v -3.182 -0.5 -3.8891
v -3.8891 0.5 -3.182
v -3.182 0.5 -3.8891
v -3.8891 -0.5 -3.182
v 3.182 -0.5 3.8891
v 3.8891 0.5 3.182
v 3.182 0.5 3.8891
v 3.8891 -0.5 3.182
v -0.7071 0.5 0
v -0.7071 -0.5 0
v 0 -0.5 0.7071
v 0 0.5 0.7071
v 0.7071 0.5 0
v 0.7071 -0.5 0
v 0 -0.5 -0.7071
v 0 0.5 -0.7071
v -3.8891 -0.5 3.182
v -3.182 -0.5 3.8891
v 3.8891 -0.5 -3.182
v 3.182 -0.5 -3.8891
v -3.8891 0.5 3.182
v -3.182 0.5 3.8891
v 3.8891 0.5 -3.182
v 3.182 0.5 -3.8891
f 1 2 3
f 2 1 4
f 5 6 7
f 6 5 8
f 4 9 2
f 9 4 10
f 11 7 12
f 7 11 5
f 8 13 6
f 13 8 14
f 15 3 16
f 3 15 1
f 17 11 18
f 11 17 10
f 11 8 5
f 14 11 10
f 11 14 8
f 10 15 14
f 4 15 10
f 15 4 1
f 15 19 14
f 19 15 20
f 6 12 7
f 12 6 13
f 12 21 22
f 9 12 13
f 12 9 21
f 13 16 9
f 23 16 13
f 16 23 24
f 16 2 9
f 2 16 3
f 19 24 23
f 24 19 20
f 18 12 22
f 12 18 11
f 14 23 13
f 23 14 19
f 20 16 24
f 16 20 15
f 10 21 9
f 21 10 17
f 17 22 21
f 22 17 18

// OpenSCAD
color("red")
rotate([0,-45,0])
cube([10,1,1], center = true);

color("red")
rotate([0,45,0])
cube([10,1,1], center = true);
